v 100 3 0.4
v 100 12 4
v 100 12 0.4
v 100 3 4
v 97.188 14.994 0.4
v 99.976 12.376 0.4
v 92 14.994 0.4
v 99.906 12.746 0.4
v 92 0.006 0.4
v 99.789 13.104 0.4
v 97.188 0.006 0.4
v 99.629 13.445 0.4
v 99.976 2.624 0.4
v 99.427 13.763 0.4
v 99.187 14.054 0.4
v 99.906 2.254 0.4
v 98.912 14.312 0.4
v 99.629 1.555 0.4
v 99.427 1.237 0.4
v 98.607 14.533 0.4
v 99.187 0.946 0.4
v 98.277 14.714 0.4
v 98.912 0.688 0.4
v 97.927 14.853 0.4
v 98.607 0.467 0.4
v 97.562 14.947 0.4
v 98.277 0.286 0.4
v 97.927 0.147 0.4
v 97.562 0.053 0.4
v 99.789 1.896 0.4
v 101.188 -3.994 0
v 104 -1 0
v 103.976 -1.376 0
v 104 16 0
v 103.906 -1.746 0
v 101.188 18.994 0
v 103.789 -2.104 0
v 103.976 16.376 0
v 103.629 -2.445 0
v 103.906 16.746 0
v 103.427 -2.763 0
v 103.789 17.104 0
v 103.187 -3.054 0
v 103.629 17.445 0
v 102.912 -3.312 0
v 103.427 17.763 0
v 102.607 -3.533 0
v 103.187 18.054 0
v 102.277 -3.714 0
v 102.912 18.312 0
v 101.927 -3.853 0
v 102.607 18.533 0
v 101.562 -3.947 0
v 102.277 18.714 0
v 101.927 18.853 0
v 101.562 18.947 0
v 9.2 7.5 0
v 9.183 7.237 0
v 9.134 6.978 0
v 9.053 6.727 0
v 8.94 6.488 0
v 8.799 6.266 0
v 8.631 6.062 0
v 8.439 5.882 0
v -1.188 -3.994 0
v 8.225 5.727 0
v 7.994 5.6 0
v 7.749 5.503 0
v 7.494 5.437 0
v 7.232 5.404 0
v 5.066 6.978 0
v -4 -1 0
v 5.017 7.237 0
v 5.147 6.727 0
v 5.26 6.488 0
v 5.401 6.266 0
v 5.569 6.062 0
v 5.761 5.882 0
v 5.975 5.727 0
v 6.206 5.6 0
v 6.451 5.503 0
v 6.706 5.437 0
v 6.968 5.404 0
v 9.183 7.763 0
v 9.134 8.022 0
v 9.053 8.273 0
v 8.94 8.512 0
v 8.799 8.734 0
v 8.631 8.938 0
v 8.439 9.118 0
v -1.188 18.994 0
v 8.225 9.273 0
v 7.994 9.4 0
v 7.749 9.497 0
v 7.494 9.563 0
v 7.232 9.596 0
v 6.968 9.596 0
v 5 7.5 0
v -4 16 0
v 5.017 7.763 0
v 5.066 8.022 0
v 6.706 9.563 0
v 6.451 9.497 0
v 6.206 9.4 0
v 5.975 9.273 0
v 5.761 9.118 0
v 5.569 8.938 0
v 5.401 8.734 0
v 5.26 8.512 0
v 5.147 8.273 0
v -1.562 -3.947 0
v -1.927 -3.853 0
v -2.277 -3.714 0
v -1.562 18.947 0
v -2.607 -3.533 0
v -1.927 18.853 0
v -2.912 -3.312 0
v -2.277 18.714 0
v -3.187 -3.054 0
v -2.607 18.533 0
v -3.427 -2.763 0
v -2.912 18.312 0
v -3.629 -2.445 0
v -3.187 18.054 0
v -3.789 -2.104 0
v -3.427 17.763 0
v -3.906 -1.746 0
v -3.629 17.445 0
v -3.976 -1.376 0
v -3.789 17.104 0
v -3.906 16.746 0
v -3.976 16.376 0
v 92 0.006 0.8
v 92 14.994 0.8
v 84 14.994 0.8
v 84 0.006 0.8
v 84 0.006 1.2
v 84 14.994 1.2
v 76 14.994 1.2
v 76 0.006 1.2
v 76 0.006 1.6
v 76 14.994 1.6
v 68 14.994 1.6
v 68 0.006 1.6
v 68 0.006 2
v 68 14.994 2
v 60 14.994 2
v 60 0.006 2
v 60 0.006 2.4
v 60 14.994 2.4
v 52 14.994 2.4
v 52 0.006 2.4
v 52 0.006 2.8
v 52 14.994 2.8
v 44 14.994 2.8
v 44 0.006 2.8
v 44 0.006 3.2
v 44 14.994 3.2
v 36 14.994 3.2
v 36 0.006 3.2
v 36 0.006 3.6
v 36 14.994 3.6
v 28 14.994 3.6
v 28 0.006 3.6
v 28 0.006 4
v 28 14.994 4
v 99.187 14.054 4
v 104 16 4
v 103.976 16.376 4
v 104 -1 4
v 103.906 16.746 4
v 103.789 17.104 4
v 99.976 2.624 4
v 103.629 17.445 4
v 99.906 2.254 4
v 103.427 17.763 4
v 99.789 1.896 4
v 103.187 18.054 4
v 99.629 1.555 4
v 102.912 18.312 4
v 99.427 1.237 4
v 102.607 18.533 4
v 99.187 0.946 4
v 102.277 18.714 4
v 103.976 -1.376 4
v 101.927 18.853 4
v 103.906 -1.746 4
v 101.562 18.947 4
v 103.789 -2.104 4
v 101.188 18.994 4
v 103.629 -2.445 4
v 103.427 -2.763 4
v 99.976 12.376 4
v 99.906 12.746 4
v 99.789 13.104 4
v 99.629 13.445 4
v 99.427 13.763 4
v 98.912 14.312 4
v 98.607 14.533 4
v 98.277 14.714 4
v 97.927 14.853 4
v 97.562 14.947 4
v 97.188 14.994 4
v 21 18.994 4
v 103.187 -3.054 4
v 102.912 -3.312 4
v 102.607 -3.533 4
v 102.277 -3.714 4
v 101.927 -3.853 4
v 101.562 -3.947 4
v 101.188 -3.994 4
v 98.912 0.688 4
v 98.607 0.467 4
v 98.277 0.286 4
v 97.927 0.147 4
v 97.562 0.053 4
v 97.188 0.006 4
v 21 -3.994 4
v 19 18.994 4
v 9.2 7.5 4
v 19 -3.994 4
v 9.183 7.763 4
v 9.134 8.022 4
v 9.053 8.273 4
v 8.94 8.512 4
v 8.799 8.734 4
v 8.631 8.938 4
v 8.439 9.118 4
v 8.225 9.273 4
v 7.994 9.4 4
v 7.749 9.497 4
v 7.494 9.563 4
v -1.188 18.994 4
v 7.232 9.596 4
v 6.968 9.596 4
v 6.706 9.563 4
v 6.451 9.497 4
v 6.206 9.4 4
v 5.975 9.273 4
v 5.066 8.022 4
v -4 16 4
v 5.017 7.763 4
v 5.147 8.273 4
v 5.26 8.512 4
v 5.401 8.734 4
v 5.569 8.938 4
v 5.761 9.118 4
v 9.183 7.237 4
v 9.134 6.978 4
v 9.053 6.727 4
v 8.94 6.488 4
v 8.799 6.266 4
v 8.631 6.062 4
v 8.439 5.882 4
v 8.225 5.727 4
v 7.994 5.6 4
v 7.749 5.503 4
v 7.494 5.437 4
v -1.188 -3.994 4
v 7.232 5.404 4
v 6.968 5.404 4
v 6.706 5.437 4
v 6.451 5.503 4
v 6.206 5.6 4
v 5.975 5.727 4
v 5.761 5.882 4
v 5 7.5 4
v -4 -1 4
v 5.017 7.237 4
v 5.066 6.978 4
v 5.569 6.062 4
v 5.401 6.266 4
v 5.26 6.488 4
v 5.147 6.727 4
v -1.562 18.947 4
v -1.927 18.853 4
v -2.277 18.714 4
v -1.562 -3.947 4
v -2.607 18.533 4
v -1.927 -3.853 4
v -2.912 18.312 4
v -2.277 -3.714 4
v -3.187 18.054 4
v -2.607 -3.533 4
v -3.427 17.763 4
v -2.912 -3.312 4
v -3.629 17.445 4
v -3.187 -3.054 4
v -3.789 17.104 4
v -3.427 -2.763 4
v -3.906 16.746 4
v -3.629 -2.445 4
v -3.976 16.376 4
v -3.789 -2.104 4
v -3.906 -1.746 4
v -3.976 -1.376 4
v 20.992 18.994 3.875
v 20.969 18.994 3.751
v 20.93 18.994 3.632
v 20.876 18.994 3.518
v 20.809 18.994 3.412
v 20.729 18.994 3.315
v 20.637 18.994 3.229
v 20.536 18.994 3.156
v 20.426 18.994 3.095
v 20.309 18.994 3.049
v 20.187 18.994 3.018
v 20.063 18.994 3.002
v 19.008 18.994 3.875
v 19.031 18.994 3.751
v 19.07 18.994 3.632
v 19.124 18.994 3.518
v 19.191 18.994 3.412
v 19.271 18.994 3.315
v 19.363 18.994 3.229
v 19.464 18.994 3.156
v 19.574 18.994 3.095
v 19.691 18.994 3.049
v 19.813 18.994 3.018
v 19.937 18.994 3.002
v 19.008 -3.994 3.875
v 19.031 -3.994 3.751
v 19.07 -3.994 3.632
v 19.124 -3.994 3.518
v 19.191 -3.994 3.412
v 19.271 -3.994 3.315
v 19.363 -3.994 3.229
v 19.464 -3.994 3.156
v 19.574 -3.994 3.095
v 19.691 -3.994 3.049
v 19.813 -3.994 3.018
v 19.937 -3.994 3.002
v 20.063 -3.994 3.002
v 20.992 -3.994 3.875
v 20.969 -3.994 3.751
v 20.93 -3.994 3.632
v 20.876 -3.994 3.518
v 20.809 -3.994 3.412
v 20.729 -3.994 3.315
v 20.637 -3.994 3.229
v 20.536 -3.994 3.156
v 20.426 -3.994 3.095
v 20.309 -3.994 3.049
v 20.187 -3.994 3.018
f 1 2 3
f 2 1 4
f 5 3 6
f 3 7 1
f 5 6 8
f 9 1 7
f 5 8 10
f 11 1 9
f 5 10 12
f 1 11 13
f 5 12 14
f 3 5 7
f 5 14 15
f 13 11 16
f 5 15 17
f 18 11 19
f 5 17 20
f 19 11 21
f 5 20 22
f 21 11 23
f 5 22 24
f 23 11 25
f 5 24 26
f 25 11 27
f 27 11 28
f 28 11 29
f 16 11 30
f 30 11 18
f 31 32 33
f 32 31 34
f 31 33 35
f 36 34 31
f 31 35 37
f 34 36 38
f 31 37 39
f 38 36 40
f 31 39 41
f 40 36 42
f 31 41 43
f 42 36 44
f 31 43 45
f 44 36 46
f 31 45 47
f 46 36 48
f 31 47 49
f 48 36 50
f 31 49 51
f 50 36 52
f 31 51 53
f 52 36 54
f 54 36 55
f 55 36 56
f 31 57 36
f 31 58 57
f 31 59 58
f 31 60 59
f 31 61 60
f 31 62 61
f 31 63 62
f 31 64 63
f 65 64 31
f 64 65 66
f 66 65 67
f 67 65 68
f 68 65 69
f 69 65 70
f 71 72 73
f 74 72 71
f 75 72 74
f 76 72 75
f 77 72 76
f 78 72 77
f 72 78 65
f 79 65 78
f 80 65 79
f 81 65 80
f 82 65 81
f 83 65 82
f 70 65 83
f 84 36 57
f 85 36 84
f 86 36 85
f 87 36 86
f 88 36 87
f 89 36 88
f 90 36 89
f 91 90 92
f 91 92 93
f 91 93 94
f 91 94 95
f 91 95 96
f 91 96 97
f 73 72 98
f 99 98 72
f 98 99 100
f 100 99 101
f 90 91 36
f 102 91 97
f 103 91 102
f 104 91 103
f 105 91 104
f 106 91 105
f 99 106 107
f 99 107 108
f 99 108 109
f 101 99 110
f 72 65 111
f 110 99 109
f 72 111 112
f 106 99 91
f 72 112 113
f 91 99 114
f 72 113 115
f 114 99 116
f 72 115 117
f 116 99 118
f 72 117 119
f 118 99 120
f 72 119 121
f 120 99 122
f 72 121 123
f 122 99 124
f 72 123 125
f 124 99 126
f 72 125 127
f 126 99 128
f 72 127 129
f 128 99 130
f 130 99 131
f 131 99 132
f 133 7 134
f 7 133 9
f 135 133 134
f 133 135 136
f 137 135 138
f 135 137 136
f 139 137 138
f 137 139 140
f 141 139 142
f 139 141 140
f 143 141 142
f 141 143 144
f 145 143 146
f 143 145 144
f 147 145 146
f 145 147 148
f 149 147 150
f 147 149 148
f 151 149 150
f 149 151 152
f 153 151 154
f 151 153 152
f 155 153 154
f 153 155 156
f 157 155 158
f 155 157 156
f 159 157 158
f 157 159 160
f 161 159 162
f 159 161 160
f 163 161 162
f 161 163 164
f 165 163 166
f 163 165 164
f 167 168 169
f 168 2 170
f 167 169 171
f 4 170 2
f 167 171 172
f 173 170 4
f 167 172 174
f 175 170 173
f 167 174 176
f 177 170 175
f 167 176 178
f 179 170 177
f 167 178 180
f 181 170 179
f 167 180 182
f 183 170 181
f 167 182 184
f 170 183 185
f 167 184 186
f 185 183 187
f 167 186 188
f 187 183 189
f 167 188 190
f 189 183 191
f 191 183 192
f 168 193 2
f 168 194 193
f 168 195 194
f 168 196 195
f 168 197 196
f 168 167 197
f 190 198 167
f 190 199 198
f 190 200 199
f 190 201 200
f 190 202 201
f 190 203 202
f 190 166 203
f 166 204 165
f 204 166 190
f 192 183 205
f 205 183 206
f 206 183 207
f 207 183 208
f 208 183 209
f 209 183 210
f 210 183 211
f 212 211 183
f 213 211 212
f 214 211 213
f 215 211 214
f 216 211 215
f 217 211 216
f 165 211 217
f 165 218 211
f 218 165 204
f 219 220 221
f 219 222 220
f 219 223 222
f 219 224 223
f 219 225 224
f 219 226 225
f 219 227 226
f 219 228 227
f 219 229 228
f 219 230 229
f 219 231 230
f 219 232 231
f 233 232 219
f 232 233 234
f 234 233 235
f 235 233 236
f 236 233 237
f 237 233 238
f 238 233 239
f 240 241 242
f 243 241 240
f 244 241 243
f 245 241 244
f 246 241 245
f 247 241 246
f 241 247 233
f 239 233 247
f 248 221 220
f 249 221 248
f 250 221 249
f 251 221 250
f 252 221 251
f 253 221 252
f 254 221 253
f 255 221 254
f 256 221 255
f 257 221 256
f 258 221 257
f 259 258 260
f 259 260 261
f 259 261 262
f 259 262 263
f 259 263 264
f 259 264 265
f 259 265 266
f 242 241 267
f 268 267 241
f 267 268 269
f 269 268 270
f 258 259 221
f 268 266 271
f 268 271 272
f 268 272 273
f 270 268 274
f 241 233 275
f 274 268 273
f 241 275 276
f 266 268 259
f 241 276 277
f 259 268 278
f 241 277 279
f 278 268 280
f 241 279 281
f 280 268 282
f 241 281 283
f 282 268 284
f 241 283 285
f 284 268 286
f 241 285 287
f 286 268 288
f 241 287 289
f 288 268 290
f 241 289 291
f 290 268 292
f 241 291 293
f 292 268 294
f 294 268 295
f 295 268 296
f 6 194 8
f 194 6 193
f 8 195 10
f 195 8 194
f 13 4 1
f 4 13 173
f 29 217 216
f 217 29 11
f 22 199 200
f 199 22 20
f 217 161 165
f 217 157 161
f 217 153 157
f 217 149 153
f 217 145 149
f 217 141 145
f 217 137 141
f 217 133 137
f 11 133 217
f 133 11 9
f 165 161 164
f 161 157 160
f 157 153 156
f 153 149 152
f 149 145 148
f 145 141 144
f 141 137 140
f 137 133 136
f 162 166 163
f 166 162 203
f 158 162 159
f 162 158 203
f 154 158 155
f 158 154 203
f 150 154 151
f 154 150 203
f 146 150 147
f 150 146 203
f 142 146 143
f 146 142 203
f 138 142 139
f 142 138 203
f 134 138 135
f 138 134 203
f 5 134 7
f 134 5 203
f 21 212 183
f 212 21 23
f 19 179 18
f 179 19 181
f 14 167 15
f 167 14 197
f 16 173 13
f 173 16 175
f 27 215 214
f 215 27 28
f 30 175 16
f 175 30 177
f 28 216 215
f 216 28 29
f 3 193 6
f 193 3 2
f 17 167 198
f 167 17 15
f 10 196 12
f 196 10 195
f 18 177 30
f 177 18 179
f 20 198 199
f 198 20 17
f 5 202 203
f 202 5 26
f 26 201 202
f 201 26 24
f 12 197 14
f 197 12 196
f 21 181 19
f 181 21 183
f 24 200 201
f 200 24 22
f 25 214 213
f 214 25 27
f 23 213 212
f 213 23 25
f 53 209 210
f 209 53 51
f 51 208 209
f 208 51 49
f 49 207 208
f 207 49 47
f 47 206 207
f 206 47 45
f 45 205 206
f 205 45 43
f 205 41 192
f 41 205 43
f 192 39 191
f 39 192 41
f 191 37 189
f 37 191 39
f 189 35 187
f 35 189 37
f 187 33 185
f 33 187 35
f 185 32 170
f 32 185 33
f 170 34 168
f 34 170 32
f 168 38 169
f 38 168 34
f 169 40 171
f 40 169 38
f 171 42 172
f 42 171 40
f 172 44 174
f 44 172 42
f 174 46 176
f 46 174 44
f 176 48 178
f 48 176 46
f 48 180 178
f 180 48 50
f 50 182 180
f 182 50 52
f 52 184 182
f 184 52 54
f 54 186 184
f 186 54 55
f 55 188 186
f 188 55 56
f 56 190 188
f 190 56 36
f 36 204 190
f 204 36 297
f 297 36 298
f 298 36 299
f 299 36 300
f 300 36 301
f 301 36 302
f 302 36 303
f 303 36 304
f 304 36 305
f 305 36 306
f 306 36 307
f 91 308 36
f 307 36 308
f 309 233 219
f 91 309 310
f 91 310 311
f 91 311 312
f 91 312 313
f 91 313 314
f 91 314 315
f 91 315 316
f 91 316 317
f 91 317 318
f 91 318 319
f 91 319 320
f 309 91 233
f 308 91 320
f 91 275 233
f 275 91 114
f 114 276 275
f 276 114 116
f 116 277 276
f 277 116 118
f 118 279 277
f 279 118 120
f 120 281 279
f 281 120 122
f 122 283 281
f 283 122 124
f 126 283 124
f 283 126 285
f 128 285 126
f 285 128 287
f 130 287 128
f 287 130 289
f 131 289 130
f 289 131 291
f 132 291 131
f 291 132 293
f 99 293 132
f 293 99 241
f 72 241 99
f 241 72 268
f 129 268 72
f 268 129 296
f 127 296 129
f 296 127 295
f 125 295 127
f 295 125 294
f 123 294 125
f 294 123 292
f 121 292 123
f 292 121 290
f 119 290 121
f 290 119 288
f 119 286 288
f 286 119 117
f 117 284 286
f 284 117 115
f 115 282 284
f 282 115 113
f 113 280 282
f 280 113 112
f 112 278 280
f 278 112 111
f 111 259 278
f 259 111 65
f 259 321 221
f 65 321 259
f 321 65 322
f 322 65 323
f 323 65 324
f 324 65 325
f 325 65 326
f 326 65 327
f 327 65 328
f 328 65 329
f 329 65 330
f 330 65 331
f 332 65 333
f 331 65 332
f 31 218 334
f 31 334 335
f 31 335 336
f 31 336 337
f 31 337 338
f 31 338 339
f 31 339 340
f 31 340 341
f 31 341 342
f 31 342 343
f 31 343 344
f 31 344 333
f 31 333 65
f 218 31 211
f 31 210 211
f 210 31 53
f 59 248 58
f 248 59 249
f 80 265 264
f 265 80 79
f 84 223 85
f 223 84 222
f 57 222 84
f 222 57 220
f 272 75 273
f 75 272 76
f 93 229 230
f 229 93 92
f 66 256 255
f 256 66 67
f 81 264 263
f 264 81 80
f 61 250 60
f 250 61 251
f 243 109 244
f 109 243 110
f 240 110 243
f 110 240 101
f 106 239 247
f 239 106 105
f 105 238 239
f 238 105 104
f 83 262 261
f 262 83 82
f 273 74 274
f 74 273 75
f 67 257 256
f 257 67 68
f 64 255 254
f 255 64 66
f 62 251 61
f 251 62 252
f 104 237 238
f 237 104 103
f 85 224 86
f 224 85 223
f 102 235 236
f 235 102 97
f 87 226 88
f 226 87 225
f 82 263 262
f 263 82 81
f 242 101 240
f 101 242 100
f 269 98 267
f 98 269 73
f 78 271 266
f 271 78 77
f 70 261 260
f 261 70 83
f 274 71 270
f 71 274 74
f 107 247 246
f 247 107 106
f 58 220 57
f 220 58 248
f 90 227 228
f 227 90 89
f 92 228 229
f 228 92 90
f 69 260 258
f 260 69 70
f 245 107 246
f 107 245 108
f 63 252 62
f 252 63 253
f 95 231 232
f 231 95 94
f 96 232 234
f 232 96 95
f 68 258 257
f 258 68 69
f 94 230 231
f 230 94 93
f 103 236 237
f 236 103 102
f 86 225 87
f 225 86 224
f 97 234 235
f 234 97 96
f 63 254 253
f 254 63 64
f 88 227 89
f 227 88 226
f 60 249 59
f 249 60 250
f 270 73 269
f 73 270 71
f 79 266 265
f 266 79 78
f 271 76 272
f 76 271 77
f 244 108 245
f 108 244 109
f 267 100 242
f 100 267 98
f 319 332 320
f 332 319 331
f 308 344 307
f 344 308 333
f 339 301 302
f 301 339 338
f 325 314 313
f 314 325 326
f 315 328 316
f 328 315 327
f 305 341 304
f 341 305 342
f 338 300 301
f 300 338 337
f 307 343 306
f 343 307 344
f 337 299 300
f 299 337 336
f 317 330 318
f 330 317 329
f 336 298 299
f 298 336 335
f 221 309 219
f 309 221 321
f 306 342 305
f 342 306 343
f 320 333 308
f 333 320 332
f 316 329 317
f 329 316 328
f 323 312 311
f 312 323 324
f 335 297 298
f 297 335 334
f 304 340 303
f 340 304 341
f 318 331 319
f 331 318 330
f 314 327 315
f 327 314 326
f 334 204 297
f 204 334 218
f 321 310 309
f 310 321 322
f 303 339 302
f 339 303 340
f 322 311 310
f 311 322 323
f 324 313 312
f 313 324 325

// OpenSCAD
/*
	Item:	Parametric Filament Swatch	
	
	Description:  A printable sample of filament color for a given filament type.

    Author:         Ezra Reynolds 
                    Ezra_Reynolds@signalcenters.org

    Notes:	Shape/Concept based on 	http://www.thingiverse.com/thing:664377
			This design is parametric, original is static.
	
	Printing:
		Printer: 	Makergear M2
		Options: 	20% Infill
		Time:	 	13 minutes
		Filament:	6.44g
		Cost:		$0.30

    Version History:
		2015-05-18 - v1.0 - First Functional Version

*/


// ======================= INCLUDE FILES ==========================
include <MCAD/2Dshapes.scad>;

// ======================= PARAMETERS =============================
mm			= 25.4;		// Inch to mm conversion
$fn 		= 50;		// Circle smoothness

// Define the range of thicknesses [minThick:stepSize:maxThick]
//  (e.g. for min=0.5, step=0.5, max=3], we would have 0.5, 1, 1.5, 2, 2.5, 3
minThick = 0.4;		// Minimum sample thickness
stepSize = 0.4;		// Delta of each thickness 
maxThick = 4;		// Maximum sample thickness

// Swatch Geometry
width			= 15;	// Width of the sample, e.g 1 inch
corner			= 3;		// Corner Radius
rimThickness 	= 4;		// Lip thickbess
tagLength 		= 20 ;	// Length of a "tag" on the top, for writing vendor/color
sampleLength 	= 8;	// Length of each sample thickness

// Mounting hole, separation groove
hole_d			= 4.2;	// Hole for mounting
holePosition 	= [hole_d/2+rimThickness+ 1, width/2, 0];	// [X,Y,Z] position of hole
grooveDepth 	= 1;	// Depth of the groove separating tag+sample

// Derived Parameters
steps 	= (maxThick-minThick) / stepSize;	// How many steps
echo ("Steps=", steps);
totalLength = tagLength + (steps+1)*sampleLength;	// Total length of swatch


// ======================= CREATE 3D PART==========================

difference()
{
	union()
	{
		intersection()
		{
			union()
			{
				// Create steps of thickness
				for (i = [0:steps])
				{
					
					length = tagLength + (steps+1-i)*sampleLength;
					echo ("i=", i, "Thickness=", (i+1)*stepSize, "Length=", length);
				
					// Make the steps
					translate ([0, 0, i*stepSize]) 
						cube ([length, width, stepSize]);
						
				}
			} // End Union
			
			// Round the corners
			translate ([totalLength/2, width/2, -1]) 
				linear_extrude(100, convexity=20)
					roundedSquare ([totalLength, width], corner);
		
		}	// End intersection
		
		// Add Rim
		translate ([totalLength/2, width/2, 0]) 
			linear_extrude((steps+1)*stepSize, convexity=20)
				difference()
				{
					roundedSquare ([totalLength+rimThickness*2, width+rimThickness*2], corner);
					roundedSquare ([totalLength, width], corner);
				}

	} // End Union

	// Make Hole
	translate (holePosition) 
		cylinder (d=hole_d, h=4*(steps+2)*stepSize, center=true);

	// Make groove for tag separation
	translate ([tagLength, width/2, (steps+1)*stepSize]) 
		rotate ([90, 0, 0]) 
			cylinder (r=grooveDepth, h=width*2, center=true);

} // End difference

// END OF FILE.  S.D.G.
